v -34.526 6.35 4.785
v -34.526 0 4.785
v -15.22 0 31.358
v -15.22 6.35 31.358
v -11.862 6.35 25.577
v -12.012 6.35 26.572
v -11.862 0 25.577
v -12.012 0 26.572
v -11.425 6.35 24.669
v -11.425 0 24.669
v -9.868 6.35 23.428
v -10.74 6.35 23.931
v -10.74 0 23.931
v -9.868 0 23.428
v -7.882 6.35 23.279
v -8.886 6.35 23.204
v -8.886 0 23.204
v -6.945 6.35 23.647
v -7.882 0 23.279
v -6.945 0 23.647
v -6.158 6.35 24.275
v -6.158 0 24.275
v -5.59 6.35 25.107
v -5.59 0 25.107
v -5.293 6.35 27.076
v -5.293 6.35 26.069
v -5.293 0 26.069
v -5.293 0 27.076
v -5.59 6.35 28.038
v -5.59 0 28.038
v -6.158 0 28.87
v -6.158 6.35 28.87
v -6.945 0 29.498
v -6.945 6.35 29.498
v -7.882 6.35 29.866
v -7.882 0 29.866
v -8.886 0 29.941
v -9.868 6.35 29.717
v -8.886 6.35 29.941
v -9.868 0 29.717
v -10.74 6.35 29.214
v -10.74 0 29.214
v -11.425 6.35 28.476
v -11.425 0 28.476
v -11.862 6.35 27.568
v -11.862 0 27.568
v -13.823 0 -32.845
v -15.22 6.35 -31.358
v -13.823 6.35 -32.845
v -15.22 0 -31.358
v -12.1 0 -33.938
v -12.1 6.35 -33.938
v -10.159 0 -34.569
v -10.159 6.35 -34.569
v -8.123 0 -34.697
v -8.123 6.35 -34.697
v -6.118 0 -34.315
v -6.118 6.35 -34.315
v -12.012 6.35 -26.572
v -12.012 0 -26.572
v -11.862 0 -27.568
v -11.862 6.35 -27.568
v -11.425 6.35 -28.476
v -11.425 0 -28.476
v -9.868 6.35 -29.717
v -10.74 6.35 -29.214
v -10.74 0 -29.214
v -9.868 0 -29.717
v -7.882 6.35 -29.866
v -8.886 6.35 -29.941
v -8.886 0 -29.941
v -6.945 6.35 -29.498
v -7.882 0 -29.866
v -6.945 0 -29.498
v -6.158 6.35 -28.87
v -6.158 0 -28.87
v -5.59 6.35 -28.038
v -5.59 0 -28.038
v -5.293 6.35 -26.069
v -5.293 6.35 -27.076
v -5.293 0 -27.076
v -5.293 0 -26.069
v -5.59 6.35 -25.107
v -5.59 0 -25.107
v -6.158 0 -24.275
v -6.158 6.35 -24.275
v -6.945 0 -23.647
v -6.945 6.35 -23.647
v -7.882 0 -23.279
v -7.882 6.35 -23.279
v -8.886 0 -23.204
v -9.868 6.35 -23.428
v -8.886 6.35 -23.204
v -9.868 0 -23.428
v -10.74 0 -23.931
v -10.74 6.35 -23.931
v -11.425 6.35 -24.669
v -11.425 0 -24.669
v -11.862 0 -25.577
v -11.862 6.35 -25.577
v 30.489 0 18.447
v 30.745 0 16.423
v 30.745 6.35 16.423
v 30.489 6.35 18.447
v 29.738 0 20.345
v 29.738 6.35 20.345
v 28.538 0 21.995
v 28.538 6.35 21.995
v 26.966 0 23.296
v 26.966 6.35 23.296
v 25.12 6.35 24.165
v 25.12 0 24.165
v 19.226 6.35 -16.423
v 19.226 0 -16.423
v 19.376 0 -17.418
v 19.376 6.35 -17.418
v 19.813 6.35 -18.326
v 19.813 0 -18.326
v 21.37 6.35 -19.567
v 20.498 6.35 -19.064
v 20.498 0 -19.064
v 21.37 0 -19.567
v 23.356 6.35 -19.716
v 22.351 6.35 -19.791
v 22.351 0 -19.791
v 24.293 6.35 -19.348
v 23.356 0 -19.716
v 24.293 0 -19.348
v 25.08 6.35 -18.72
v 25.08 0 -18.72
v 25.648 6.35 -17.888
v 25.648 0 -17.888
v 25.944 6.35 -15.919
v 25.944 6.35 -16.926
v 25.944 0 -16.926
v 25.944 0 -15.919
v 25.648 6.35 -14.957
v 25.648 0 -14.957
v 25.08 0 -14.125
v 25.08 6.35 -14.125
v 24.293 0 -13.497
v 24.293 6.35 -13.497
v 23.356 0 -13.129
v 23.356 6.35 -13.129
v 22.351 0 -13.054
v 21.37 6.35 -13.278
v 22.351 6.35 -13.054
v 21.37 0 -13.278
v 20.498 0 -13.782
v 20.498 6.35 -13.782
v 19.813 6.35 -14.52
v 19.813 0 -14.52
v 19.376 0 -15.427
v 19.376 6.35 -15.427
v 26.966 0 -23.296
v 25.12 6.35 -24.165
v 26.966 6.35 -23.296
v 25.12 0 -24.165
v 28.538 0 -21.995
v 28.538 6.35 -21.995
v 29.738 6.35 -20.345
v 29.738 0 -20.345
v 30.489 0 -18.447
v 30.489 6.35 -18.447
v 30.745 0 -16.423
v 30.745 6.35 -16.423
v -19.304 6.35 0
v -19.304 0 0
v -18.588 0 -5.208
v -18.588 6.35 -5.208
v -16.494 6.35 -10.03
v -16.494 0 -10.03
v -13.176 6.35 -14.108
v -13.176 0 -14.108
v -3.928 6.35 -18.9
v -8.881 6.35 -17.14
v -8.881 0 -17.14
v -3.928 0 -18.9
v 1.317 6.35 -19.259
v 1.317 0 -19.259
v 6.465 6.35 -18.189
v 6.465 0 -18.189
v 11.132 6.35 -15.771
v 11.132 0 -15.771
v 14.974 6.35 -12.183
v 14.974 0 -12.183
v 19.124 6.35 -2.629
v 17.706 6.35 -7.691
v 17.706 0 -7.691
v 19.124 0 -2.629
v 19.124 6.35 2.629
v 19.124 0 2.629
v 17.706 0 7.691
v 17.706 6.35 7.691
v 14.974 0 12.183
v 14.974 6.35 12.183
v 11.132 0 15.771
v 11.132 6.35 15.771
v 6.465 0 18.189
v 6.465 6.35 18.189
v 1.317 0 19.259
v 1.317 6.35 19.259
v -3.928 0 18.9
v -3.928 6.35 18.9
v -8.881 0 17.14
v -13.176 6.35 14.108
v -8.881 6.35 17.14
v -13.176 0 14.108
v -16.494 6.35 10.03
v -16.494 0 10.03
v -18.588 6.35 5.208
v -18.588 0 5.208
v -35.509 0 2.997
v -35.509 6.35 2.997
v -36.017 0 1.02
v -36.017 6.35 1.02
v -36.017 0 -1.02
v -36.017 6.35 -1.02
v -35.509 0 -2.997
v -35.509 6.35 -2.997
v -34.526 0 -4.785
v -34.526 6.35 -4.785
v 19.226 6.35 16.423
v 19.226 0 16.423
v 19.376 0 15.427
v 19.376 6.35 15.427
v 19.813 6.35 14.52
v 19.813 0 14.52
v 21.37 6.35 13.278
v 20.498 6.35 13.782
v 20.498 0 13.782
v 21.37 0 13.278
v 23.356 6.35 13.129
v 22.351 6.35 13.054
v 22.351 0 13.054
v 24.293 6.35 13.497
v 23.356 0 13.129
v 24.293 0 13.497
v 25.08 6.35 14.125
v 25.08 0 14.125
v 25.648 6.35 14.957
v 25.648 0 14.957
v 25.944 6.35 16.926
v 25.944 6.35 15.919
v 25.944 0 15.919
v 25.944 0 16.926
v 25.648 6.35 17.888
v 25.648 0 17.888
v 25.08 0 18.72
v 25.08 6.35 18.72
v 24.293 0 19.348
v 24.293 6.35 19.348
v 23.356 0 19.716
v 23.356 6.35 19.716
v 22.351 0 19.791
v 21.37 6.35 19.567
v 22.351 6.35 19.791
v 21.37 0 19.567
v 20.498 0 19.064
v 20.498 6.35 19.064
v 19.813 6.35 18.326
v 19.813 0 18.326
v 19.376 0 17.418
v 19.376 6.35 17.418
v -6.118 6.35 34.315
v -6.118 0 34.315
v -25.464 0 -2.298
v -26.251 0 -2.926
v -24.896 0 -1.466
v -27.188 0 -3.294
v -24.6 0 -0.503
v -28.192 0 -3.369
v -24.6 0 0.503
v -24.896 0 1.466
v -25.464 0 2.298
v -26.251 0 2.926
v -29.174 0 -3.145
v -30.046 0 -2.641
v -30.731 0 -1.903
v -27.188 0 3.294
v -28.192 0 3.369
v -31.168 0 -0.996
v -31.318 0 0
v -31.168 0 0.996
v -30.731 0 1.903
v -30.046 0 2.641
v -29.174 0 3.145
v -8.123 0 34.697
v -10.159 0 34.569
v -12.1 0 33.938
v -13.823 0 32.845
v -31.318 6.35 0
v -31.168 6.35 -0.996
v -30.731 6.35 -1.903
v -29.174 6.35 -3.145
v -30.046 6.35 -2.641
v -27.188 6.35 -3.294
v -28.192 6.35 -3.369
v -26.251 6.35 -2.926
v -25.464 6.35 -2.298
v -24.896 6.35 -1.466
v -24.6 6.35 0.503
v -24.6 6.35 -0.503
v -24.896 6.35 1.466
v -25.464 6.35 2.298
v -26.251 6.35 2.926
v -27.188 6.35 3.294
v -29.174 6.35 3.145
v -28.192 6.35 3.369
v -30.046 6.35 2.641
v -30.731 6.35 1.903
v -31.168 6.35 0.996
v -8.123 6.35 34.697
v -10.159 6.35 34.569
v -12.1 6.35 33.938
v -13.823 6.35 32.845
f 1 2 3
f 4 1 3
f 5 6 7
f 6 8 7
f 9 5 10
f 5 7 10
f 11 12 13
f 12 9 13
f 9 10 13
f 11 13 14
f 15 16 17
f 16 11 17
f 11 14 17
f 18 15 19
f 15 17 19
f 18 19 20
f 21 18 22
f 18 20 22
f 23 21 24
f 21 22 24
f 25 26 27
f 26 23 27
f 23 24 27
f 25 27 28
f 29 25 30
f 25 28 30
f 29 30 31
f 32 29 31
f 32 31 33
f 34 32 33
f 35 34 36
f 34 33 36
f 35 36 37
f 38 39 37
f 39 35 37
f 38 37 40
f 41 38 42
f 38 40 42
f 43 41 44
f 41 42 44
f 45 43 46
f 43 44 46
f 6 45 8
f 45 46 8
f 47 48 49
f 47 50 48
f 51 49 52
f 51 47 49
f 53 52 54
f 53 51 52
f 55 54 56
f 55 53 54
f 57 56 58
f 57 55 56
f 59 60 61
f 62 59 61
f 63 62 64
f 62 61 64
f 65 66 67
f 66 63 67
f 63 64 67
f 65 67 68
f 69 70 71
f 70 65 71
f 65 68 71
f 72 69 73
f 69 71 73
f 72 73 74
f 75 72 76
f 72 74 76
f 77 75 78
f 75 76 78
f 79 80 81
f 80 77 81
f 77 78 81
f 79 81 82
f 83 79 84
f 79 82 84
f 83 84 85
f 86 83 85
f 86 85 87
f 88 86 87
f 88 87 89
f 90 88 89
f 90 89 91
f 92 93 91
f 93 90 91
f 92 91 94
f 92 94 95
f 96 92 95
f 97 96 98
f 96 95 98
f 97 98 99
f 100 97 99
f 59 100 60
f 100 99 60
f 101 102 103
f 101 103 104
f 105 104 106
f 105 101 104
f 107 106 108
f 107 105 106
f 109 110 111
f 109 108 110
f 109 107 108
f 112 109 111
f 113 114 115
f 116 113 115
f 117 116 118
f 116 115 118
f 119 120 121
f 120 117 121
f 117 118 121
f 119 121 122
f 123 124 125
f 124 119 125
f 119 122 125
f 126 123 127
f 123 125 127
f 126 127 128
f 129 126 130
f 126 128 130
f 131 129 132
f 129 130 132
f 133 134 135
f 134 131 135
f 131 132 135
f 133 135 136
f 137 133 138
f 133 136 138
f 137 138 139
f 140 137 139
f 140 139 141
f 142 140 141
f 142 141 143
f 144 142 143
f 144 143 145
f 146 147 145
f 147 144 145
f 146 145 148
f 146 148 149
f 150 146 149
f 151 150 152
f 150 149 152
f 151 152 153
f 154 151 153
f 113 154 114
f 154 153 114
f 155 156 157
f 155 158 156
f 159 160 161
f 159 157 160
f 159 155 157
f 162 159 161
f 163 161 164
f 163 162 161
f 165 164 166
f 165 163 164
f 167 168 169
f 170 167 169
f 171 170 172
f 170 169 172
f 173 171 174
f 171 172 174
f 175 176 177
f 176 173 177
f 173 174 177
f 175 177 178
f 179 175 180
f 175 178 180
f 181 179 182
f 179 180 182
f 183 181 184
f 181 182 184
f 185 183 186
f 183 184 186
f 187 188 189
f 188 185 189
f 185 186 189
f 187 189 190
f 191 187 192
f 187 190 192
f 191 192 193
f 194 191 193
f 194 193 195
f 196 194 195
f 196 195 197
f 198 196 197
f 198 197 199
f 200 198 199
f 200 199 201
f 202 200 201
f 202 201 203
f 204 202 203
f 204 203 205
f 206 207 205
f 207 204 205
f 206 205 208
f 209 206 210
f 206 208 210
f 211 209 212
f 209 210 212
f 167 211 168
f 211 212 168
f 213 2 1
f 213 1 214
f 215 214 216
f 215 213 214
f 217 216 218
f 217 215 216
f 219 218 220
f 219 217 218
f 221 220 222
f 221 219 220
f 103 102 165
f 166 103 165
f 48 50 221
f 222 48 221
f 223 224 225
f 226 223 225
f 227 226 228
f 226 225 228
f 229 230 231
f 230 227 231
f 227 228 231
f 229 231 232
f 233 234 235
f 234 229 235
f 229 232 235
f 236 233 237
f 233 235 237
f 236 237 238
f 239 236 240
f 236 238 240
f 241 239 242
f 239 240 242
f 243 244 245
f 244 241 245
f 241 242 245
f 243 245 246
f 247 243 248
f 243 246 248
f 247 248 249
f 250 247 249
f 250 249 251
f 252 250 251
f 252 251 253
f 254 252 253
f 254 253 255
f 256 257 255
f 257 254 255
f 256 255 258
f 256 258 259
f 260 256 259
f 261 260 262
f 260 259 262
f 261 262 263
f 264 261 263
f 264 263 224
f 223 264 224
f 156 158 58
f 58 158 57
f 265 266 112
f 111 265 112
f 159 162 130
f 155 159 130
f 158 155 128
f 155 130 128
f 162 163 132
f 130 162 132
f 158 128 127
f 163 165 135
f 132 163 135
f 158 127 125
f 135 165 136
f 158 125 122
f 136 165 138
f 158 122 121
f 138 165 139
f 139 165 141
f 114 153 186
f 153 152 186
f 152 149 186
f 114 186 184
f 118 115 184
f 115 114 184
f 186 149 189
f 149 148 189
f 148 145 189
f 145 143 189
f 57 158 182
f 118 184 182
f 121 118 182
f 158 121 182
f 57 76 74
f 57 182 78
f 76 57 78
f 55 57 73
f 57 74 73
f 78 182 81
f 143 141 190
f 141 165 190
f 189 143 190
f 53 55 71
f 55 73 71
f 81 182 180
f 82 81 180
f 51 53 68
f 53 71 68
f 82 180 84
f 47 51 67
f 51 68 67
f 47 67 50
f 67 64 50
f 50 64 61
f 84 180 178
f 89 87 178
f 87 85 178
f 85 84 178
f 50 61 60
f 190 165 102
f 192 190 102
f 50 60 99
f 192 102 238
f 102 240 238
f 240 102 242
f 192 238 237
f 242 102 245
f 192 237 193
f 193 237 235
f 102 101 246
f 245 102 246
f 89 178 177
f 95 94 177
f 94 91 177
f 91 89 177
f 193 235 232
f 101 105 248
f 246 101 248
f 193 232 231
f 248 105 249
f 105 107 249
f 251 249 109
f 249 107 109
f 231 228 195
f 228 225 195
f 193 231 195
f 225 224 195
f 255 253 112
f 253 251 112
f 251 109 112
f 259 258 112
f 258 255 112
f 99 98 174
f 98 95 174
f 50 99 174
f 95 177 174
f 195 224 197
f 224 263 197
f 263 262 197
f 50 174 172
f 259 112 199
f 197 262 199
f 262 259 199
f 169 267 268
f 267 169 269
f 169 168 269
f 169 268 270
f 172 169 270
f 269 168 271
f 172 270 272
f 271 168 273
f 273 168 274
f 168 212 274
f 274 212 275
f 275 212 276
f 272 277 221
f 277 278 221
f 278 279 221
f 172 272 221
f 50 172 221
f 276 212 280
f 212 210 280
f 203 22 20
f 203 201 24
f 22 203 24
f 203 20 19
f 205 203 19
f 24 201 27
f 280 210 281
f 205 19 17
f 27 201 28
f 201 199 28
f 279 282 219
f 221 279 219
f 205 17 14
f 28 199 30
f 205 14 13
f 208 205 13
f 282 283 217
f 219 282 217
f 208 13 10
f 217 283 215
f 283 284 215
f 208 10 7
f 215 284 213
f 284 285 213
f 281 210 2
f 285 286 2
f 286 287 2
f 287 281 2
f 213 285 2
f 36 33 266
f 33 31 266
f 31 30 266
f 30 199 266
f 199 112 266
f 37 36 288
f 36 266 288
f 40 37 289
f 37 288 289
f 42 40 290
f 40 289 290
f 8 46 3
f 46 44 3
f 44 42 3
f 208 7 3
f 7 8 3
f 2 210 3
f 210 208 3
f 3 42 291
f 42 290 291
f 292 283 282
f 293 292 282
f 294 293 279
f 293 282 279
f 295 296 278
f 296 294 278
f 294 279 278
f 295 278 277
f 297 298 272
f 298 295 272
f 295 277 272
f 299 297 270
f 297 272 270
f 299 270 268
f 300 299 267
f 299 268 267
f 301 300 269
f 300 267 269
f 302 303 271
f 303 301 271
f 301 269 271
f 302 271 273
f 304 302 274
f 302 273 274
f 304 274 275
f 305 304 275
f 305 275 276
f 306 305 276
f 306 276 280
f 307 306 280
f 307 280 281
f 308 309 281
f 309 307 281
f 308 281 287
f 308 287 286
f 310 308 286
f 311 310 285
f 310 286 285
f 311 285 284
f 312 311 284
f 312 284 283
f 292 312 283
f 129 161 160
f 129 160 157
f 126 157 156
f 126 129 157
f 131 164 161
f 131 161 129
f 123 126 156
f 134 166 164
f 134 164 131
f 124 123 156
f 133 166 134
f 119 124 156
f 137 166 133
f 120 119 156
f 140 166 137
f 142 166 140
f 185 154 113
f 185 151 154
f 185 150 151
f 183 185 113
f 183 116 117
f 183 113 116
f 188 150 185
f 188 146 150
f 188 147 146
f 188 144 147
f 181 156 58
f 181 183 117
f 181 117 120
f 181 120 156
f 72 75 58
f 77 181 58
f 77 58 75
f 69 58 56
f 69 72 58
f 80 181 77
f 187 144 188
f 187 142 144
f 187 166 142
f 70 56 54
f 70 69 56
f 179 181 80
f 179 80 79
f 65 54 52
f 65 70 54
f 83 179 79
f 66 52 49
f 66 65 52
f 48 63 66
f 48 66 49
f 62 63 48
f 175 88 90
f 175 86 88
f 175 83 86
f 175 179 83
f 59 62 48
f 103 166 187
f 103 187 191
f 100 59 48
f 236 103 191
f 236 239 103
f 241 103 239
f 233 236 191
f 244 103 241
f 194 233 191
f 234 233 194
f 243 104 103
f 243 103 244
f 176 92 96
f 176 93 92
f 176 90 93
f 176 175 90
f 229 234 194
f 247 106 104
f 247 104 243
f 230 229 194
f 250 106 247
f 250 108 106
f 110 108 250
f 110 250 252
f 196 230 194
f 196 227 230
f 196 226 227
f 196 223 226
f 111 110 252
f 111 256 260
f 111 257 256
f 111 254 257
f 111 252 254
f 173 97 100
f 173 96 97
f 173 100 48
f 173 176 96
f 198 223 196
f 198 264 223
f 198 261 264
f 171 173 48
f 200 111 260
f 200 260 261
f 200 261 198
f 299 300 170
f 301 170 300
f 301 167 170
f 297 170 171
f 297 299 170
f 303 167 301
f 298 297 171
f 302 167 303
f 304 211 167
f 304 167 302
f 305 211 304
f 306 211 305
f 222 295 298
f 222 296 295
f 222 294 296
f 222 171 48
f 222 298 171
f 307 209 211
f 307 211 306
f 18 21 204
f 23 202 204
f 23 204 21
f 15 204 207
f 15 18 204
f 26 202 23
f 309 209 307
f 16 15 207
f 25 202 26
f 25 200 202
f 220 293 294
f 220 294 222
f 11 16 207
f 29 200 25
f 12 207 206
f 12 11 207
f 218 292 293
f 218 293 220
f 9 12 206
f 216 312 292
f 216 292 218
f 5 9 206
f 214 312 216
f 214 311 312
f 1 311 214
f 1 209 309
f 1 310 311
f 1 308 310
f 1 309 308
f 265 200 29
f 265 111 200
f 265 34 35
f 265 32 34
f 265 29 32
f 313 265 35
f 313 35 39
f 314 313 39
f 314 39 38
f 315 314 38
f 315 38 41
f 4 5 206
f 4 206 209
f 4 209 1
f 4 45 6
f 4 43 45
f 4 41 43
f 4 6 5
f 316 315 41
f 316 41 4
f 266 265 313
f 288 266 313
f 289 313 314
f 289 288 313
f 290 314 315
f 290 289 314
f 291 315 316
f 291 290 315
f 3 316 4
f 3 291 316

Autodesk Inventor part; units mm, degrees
ref_plane "YZ Plane" through (0, 0, 0) normal (1, 0, 0) x (0, 1, 0)
ref_plane "XZ Plane" through (0, 0, 0) normal (0, 1, 0) x (-1, 0, 0)
ref_plane "XY Plane" through (0, 0, 0) normal (0, 0, 1) x (1, 0, 0)
sketch "Sketch1" plane through (0, 0, 0) normal (0, 1, 0) x (-1, 0, 0)
  circle A0 centre (0, 0) radius 19.304
  line L0 (0, 0) -> (27.94, 0) construction
  circle A1 centre (27.94, 0) radius 3.3782
  circle A2 centre (8.6339, 26.5725) radius 3.3782
  circle A3 centre (-22.6039, 16.4227) radius 3.3782
  circle A4 centre (-22.6039, -16.4227) radius 3.3782
  circle A5 centre (8.6339, -26.5725) radius 3.3782
  line L1 (34.526, 4.785) -> (15.2199, 31.3575)
  arc A6 (15.2199, 31.3575) -> (6.1183, 34.3148) centre (8.6339, 26.5725) ccw
  line L2 (6.1183, 34.3148) -> (-25.1195, 24.165)
  arc A7 (-25.1195, 24.165) -> (-30.7446, 16.4227) centre (-22.6039, 16.4227) ccw
  line L3 (-30.7446, 16.4227) -> (-30.7446, -16.4227)
  arc A8 (-30.7446, -16.4227) -> (-25.1195, -24.165) centre (-22.6039, -16.4227) ccw
  line L4 (-25.1195, -24.165) -> (6.1183, -34.3148)
  arc A9 (6.1183, -34.3148) -> (15.2199, -31.3575) centre (8.6339, -26.5725) ccw
  line L5 (15.2199, -31.3575) -> (34.526, -4.785)
  arc A10 (34.526, -4.785) -> (34.526, 4.785) centre (27.94, 0) ccw
  dimension "d0" = 38.608
  dimension "d1" = 27.94
  dimension "d2" = 6.7564
  dimension "d5" = 360
  dimension "d7" = 4.7625
extrude "Extrusion1" add sketch "Sketch1" along normal blind 6.35
properties part number "gearSpacer" material "Aluminum 6061"
